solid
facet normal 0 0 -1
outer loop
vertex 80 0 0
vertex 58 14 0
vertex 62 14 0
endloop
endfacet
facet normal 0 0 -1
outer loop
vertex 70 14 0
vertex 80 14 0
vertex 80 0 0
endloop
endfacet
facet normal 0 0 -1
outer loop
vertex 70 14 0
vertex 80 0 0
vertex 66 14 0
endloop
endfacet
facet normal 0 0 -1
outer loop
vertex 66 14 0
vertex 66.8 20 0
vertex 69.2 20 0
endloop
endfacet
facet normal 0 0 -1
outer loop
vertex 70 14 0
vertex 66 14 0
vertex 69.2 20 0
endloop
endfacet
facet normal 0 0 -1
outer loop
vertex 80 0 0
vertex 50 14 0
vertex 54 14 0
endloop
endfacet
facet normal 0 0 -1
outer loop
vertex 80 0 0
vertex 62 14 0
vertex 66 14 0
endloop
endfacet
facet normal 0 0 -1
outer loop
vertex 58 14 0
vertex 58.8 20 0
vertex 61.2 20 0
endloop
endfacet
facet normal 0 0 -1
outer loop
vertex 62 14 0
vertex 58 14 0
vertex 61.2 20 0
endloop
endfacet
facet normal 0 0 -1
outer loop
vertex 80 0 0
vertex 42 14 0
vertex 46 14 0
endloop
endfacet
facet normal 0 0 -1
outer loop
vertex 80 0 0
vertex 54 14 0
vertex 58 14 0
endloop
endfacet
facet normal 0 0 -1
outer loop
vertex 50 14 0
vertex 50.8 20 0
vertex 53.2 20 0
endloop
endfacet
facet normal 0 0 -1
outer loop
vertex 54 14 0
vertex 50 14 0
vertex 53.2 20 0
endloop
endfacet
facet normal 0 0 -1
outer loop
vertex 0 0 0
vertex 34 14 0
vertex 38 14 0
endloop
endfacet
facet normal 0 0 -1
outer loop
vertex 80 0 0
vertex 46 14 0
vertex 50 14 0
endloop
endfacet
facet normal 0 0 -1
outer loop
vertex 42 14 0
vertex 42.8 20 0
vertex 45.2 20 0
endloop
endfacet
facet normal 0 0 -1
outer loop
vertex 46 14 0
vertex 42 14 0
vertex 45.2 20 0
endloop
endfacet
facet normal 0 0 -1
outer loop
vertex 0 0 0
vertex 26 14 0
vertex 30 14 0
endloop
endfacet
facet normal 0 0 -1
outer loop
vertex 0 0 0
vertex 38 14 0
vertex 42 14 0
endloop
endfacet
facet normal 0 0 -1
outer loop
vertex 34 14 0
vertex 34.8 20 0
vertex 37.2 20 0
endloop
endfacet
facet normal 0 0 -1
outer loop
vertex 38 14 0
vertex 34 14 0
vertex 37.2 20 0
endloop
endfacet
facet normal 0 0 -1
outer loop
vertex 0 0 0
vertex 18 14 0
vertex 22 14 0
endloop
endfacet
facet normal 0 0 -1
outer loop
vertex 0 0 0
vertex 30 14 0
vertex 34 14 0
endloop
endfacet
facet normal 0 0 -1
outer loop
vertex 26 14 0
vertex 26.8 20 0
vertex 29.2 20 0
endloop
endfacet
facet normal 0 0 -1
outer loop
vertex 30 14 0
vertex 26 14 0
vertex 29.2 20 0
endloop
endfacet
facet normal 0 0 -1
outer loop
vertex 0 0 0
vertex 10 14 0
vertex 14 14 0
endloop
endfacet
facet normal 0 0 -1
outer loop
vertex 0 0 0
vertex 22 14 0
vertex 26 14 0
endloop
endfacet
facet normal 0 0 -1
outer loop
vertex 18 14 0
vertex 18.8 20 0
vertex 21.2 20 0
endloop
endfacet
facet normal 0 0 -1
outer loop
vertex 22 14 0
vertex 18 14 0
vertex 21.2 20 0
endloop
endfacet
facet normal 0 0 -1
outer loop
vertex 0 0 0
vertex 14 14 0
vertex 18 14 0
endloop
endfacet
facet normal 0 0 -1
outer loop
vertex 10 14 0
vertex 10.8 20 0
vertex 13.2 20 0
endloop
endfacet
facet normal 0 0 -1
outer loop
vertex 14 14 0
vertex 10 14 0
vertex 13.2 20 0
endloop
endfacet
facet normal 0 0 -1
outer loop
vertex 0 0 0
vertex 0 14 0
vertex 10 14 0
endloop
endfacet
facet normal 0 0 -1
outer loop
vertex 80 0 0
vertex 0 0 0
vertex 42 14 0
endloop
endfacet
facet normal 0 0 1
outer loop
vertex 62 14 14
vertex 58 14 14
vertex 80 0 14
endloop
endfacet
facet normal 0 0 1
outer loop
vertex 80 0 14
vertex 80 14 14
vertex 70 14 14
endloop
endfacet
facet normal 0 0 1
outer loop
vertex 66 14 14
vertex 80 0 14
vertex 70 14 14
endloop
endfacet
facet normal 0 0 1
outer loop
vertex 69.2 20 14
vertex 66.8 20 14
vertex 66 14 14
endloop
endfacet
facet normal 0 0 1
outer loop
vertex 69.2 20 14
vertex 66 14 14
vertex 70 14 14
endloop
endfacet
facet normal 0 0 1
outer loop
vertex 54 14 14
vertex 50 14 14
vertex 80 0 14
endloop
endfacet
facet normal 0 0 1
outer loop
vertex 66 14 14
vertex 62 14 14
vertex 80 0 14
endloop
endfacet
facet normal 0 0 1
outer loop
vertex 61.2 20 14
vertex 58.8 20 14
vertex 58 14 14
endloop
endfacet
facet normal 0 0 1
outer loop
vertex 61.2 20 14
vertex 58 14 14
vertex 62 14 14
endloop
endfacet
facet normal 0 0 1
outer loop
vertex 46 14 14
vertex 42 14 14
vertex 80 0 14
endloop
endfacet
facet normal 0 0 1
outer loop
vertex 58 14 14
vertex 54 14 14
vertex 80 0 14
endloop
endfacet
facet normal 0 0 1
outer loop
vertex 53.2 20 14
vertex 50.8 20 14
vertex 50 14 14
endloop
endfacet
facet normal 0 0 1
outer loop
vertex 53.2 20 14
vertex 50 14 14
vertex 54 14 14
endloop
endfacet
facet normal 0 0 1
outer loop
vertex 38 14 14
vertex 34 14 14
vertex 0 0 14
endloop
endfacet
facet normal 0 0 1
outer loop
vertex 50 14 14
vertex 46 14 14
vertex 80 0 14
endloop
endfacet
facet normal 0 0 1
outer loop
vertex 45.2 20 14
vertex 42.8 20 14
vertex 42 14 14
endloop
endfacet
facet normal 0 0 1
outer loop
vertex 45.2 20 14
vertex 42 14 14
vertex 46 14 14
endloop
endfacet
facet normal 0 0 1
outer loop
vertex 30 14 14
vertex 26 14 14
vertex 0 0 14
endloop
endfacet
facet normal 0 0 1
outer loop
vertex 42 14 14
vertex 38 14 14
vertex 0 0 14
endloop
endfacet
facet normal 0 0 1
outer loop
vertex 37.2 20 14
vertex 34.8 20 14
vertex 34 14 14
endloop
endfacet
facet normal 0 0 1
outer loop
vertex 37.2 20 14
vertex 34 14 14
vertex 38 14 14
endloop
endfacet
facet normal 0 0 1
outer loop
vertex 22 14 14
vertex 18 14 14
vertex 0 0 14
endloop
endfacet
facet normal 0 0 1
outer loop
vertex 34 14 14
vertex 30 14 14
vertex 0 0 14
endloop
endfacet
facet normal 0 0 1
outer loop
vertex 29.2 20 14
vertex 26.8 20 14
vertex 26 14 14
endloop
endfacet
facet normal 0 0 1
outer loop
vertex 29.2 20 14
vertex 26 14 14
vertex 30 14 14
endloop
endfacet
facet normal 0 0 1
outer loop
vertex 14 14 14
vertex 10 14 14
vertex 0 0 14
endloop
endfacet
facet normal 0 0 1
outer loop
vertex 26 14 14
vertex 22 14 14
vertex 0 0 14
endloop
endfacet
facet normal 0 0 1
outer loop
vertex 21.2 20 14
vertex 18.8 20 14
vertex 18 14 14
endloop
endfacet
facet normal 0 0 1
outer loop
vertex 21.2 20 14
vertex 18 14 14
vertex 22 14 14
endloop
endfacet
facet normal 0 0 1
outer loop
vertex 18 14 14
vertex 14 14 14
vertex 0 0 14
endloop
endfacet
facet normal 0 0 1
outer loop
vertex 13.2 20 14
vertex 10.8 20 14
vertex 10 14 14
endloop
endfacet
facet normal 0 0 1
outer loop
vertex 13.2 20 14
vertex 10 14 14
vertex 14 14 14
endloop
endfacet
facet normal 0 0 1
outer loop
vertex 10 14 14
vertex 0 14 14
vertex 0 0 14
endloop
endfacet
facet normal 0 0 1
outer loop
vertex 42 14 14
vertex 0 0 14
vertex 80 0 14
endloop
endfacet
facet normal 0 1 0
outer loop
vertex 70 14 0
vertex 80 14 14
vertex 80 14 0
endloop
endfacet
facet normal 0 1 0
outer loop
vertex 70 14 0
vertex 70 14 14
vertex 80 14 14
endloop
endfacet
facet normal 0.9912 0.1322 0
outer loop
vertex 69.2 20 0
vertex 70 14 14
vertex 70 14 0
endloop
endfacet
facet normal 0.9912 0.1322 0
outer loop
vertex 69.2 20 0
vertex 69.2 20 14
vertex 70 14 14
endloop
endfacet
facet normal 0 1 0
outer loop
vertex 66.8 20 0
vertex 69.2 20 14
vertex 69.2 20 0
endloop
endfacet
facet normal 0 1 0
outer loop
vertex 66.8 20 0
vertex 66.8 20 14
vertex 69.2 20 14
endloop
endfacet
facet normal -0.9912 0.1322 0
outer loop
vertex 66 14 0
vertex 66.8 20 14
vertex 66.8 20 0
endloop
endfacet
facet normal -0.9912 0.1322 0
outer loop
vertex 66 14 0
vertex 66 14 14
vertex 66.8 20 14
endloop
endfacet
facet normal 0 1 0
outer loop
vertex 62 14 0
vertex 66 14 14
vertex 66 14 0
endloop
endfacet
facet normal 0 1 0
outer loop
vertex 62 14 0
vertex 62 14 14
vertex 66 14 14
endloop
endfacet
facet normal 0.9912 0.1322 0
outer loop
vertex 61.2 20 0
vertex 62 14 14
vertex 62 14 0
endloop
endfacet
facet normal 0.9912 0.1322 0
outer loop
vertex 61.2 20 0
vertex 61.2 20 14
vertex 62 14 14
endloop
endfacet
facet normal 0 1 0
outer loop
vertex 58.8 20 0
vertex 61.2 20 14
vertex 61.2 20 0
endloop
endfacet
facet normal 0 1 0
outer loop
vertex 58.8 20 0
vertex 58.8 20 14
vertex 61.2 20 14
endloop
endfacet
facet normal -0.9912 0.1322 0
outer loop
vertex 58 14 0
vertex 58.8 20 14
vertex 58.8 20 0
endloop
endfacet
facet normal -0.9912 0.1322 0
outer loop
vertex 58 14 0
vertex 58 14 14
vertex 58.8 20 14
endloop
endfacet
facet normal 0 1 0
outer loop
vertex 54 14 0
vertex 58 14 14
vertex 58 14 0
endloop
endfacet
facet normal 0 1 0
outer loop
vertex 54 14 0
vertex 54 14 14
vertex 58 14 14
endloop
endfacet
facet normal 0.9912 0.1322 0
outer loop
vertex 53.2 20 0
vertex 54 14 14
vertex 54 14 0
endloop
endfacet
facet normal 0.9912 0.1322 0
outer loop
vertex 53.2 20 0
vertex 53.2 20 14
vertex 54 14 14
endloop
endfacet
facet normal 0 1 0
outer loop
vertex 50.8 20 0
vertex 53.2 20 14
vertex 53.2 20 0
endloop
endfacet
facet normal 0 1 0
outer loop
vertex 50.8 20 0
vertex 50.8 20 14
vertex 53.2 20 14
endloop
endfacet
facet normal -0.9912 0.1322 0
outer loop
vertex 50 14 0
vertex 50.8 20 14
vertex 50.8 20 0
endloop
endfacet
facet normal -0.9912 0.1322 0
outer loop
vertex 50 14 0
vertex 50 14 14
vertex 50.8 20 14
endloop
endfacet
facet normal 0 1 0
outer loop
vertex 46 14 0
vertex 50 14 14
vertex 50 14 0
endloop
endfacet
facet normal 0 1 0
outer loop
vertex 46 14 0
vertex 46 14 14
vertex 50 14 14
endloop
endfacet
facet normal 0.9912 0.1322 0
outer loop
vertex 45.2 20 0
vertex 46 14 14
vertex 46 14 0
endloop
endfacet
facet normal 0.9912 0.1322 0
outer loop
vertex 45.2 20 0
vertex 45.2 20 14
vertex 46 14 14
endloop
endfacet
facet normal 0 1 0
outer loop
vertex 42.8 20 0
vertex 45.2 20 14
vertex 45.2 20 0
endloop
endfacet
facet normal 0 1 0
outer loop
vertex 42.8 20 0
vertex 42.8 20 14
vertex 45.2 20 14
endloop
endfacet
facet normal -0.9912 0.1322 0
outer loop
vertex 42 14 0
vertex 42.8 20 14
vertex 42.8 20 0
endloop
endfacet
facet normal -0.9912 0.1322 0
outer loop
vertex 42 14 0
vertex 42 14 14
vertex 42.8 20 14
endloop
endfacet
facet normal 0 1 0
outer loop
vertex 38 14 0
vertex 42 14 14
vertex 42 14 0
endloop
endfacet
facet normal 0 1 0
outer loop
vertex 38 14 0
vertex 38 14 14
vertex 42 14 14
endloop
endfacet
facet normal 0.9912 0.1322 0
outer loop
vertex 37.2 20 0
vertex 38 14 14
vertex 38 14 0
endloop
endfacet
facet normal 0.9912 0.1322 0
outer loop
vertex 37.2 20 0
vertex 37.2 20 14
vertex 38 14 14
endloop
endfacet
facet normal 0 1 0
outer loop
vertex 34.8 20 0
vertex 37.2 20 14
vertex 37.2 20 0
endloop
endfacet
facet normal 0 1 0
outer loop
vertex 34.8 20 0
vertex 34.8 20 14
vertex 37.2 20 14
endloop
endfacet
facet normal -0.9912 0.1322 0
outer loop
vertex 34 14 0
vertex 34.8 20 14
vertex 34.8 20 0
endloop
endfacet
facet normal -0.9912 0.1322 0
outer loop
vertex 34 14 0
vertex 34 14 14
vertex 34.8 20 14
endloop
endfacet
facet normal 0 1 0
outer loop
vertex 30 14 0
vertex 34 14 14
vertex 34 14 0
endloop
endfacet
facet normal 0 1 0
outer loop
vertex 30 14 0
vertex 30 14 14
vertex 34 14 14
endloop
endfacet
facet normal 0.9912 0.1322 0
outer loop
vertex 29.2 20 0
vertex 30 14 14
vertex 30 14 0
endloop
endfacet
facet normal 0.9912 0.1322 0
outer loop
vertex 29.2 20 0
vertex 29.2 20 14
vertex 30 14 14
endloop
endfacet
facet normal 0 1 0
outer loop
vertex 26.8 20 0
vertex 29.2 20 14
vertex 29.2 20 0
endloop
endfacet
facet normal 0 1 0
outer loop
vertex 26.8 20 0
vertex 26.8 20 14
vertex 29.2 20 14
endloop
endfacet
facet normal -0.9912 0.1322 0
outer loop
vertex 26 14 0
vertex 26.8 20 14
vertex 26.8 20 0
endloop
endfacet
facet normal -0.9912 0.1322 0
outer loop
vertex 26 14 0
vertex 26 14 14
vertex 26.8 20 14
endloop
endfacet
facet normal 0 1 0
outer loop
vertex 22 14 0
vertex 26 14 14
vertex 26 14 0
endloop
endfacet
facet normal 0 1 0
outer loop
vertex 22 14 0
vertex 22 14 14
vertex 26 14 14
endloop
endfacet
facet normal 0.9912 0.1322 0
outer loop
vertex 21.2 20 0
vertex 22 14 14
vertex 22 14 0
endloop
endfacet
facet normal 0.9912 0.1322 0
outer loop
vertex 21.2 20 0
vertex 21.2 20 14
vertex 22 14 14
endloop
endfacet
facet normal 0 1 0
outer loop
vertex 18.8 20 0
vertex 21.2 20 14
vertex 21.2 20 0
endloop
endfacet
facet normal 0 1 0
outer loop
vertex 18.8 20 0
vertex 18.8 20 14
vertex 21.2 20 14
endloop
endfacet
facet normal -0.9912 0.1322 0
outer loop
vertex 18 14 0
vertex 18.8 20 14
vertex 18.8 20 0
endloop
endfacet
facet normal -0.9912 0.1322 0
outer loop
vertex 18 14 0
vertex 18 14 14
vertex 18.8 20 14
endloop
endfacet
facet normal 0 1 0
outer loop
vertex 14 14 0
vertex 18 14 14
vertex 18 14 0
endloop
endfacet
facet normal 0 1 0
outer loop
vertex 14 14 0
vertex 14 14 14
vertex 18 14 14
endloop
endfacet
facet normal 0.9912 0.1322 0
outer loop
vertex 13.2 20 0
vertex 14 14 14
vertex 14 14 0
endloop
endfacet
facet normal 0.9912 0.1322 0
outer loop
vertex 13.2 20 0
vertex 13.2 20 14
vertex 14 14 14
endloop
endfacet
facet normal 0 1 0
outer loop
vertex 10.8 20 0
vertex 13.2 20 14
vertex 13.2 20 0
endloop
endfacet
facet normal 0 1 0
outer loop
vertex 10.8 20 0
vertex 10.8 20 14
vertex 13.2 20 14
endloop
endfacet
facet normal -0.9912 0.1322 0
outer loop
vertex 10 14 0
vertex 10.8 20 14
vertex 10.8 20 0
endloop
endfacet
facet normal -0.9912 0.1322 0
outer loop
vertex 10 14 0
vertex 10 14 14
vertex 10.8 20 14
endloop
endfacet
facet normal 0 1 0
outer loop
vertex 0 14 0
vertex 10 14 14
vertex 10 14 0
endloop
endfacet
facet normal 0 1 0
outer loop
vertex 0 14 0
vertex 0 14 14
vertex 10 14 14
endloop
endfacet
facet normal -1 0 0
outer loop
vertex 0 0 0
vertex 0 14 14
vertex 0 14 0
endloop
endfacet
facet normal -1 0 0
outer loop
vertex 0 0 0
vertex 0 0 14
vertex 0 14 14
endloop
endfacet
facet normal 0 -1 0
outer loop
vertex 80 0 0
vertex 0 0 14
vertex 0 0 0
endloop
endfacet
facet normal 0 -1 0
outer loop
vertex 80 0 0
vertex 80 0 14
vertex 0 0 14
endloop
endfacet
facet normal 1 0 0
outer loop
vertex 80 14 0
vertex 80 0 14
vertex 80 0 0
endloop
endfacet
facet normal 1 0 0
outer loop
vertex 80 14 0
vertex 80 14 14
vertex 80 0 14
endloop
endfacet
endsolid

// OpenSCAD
$fn = 32;

// ----------------------------------------------------------------------
// Gear rack: 8 teeth on a 80 mm bar, pitch 8 mm
// ----------------------------------------------------------------------

// --- parameters (mm) ---
profile_height = 14;      // extrusion height
profile_points = 36;      // points of the closed outline

profile = [[0, 0], [80, 0], [80, 14], [70, 14], [69.2, 20], [66.8, 20], [66, 14], [62, 14], [61.2, 20], [58.8, 20], [58, 14], [54, 14], [53.2, 20], [50.8, 20], [50, 14], [46, 14], [45.2, 20], [42.8, 20], [42, 14], [38, 14], [37.2, 20], [34.8, 20], [34, 14], [30, 14], [29.2, 20], [26.8, 20], [26, 14], [22, 14], [21.2, 20], [18.8, 20], [18, 14], [14, 14], [13.2, 20], [10.8, 20], [10, 14], [0, 14]];  // single closed polygon, 36 points, counter clockwise

// --- the one profile operation ---
linear_extrude(height = profile_height) polygon(points = profile);
